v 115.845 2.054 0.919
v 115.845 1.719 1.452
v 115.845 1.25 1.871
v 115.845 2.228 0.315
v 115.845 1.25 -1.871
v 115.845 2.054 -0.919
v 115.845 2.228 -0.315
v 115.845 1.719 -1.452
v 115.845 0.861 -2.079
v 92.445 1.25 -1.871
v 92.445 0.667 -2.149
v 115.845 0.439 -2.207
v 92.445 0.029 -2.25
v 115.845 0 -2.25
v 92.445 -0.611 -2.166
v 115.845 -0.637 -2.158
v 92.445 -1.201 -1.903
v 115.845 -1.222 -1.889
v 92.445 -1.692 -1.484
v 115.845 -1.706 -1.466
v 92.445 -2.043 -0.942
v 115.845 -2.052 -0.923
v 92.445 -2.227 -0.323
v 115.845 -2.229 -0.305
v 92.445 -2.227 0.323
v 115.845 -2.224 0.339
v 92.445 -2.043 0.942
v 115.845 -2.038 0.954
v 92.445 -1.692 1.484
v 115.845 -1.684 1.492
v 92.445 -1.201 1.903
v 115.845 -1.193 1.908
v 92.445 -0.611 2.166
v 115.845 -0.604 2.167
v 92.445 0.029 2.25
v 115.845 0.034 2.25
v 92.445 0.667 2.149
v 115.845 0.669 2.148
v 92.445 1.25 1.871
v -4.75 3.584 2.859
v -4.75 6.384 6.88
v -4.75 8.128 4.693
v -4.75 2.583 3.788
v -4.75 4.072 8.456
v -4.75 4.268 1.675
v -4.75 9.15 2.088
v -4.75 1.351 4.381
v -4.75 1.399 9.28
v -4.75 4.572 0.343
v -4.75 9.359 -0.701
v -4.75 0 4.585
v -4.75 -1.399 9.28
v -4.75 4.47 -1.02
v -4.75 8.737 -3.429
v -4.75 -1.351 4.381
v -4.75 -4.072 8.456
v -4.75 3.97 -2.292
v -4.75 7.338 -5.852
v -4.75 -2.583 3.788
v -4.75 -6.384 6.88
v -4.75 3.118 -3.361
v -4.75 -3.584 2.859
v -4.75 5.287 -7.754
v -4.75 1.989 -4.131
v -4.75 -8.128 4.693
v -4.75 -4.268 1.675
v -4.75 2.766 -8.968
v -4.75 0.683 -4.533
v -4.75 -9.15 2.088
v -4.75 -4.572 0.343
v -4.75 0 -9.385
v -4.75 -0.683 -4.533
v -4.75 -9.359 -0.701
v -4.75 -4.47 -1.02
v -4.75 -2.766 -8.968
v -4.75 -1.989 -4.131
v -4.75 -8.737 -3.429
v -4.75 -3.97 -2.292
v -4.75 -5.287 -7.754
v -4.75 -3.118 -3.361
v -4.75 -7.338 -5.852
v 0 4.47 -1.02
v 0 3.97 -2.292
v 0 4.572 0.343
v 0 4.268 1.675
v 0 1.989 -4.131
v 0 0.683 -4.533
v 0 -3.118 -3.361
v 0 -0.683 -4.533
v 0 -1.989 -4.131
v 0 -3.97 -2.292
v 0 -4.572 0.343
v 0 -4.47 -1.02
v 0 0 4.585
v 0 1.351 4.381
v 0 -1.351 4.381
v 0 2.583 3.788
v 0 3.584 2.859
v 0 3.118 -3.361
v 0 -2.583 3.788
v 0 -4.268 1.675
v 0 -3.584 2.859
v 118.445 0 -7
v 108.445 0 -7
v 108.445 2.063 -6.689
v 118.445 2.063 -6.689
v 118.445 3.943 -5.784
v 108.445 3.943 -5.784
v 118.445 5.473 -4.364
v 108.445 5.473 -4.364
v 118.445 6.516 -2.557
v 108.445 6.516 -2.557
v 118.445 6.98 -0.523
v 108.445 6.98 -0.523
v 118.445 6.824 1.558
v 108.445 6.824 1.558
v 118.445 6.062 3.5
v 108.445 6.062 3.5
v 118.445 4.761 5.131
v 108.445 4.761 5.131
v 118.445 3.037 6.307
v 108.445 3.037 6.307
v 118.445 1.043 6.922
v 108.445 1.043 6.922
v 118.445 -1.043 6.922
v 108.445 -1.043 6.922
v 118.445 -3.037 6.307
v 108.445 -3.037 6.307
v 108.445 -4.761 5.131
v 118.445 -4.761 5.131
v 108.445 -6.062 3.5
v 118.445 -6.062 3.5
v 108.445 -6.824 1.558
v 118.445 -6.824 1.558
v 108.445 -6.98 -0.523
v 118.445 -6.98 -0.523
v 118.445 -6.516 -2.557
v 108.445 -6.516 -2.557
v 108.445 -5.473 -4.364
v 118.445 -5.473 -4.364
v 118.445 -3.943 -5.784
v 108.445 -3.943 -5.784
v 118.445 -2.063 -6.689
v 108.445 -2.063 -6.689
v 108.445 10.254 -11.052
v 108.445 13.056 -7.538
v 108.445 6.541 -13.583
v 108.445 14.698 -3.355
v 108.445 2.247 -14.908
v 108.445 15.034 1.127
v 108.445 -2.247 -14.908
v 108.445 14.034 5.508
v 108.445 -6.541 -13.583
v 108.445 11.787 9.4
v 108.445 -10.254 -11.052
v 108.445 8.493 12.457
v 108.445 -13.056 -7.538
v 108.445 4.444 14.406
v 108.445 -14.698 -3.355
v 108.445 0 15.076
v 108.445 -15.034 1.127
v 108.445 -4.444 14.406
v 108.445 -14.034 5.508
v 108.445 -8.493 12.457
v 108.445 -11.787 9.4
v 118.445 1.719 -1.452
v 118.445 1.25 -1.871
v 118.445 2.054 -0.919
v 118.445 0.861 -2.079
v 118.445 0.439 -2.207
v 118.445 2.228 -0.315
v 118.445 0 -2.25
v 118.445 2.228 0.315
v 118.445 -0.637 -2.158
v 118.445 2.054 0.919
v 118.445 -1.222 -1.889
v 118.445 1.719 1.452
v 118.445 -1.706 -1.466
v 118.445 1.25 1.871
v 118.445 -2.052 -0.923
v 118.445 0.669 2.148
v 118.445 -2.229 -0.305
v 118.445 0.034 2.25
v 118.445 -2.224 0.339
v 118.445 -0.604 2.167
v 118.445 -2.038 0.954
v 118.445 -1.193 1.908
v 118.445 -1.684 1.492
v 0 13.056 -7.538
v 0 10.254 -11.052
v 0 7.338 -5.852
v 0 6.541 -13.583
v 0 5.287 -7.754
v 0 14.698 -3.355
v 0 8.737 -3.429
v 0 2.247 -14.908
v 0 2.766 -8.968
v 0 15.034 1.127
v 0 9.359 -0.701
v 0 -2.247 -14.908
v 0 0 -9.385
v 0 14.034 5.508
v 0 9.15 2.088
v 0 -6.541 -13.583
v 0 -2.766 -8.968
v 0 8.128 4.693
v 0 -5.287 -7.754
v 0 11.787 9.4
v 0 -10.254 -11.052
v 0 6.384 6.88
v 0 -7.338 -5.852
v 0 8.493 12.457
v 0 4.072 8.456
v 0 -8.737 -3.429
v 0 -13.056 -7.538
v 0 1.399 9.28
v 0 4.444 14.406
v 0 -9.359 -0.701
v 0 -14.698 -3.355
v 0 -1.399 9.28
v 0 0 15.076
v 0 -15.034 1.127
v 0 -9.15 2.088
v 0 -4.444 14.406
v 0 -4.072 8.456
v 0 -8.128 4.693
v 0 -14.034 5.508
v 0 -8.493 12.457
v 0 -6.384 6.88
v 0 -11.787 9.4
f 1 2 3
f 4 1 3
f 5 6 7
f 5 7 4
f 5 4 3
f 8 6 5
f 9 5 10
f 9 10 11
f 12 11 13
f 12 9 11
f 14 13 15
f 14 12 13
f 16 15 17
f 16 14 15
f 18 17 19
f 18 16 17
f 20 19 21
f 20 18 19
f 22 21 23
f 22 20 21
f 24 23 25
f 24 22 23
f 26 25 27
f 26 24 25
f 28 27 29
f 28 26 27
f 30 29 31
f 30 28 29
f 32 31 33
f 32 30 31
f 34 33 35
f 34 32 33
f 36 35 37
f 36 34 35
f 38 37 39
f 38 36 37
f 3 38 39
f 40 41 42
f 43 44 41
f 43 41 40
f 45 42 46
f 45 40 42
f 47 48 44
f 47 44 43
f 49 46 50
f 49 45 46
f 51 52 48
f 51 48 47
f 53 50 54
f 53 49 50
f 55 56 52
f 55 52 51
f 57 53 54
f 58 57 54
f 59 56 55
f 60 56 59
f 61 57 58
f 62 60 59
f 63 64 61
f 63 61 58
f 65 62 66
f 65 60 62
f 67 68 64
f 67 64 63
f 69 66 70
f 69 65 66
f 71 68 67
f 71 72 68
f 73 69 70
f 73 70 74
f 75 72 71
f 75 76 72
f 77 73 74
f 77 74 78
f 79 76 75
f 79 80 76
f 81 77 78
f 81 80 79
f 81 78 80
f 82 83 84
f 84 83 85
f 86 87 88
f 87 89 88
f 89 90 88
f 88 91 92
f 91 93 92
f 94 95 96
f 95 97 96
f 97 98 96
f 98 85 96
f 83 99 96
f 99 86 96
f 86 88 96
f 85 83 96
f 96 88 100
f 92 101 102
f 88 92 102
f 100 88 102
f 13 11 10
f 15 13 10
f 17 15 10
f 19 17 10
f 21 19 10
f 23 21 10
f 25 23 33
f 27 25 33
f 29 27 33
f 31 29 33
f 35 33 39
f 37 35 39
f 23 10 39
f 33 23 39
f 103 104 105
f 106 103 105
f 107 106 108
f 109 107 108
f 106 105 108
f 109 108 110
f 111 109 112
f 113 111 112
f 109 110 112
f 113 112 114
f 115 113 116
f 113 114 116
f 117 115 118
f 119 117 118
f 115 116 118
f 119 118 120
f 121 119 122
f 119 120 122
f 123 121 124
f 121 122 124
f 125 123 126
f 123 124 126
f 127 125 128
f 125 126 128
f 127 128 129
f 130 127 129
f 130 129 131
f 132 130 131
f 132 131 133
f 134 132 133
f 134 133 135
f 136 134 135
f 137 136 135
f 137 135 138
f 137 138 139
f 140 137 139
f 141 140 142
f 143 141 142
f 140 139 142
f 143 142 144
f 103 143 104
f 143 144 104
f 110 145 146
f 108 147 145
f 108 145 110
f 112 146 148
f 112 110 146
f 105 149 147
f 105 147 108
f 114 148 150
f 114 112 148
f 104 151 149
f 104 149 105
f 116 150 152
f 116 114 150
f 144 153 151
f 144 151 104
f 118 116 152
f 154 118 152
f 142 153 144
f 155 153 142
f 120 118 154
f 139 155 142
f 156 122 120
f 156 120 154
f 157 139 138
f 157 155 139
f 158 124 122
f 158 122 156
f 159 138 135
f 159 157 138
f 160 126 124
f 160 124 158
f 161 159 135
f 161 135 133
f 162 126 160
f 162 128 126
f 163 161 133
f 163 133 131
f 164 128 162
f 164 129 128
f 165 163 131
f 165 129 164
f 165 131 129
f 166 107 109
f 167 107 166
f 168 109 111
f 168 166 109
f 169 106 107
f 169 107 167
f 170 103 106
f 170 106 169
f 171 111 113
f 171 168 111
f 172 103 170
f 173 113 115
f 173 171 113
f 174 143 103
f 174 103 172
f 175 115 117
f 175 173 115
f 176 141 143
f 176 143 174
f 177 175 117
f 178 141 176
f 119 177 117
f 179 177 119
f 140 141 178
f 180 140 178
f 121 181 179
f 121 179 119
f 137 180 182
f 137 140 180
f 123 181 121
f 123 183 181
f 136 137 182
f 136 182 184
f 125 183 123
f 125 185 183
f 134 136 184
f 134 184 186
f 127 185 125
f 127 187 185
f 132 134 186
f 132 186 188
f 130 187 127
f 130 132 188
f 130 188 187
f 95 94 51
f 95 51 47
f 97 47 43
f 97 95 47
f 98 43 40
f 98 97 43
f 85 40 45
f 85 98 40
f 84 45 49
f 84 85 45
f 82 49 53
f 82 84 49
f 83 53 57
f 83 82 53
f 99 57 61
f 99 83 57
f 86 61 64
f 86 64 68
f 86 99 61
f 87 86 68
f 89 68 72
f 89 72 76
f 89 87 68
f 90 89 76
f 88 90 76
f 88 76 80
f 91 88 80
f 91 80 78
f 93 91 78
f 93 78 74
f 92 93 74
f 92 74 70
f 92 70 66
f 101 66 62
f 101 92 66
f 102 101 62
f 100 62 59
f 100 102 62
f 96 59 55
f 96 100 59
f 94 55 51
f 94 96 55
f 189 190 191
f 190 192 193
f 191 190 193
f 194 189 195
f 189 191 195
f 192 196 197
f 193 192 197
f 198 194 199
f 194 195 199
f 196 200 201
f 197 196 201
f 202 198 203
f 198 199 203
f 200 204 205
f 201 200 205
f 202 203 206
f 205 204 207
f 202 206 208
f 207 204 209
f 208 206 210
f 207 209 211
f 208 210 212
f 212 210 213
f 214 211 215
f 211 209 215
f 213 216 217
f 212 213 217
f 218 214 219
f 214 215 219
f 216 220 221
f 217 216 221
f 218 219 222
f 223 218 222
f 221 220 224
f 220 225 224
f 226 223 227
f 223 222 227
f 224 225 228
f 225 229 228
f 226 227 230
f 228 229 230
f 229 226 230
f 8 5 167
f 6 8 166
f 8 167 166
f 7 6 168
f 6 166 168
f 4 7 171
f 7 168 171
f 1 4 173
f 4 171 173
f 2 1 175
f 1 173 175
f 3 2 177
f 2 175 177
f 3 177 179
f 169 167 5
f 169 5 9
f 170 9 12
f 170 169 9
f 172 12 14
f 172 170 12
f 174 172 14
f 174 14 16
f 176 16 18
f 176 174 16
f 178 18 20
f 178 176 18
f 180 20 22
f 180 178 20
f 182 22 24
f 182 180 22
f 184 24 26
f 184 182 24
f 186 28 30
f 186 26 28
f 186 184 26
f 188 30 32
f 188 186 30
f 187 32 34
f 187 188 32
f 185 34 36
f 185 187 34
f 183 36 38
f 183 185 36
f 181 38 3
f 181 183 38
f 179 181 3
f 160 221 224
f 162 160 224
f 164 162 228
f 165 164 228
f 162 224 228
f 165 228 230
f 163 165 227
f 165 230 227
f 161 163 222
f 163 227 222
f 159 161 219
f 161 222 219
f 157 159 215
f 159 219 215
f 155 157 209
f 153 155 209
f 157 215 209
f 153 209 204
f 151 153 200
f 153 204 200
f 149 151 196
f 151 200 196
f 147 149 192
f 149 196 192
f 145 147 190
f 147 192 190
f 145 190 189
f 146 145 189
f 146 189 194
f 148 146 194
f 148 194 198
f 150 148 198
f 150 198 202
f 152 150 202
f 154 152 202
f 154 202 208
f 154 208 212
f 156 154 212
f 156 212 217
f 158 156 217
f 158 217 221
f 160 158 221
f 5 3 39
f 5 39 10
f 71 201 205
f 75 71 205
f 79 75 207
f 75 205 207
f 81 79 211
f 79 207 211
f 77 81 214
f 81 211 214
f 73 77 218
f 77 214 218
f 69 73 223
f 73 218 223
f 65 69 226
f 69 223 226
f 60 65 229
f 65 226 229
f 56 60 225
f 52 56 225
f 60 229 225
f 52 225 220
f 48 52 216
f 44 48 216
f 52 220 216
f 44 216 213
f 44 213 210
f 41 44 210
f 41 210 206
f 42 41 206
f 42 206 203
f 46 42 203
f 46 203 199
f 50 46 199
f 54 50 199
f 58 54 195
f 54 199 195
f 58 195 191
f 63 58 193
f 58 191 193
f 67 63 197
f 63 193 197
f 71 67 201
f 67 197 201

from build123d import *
from build123d.topology import SkipClean

# Parameters (mm, degrees)
SKETCH1_R           = 15.07617
BOSS_EXTRUDE1_DEPTH = 118.4446395
SKETCH2_R           = 9.3853
SKETCH2_R_2         = 4.5847
BOSS_EXTRUDE2_DEPTH = 4.7498
CUT_EXTRUDE1_DEPTH  = 26
SKETCH4_R           = 2.25
CUT_EXTRUDE2_DEPTH  = 2.6
CUT_EXTRUDE3_START  = -10
SKETCH5_R           = 15.07617
SKETCH5_R_2         = 7
CUT_EXTRUDE3_DEPTH  = 10


with BuildPart() as part:
    # Sketch1 → Boss-Extrude1 (new body)
    with BuildSketch(Plane(origin=(0, 0, 0), x_dir=(0, 0, -1), z_dir=(1, 0, 0))):
        with Locations(Location((0, 0, 0), (0, 0, 180))):
            Circle(SKETCH1_R)
    extrude(amount=BOSS_EXTRUDE1_DEPTH)

    # Sketch2 → Boss-Extrude2 (add)
    with BuildSketch(Plane.ZY):
        with Locations(Location((0, 0, 0), (0, 0, 180))):
            Circle(SKETCH2_R)
        Circle(SKETCH2_R_2, mode=Mode.SUBTRACT)
    extrude(amount=BOSS_EXTRUDE2_DEPTH)

    # Sketch3 → Cut-Extrude1 (cut)
    with BuildSketch(Plane(origin=(118.4446395, 0, 0), x_dir=(0, 0, -1), z_dir=(1, 0, 0))):
        with BuildLine():
            Line((-1.870828693, 1.25), (1.870828693, 1.25))
            ThreePointArc((1.870828693, 1.25), (0, -2.25), (-1.870828693, 1.25))
        make_face()
    extrude(amount=-CUT_EXTRUDE1_DEPTH, mode=Mode.SUBTRACT)

    # Sketch4 → Cut-Extrude2 (cut)
    with SkipClean():  # the faces are left unmerged after this step: merging them gives an invalid solid
        with BuildSketch(Plane(origin=(118.4446395, 0, 0), x_dir=(0, 0, -1), z_dir=(1, 0, 0))):
            Circle(SKETCH4_R)
        extrude(amount=-CUT_EXTRUDE2_DEPTH, mode=Mode.SUBTRACT)

    # Sketch5 → Cut-Extrude3 (cut)
    with SkipClean():  # the faces are left unmerged after this step: merging them gives an invalid solid
        with BuildSketch(Plane(origin=(118.4446395, 0, 0), x_dir=(0, 0, -1), z_dir=(1, 0, 0)).offset(CUT_EXTRUDE3_START)):
            with Locations(Location((0, 0, 0), (0, 0, 180))):
                Circle(SKETCH5_R)
            Circle(SKETCH5_R_2, mode=Mode.SUBTRACT)
        extrude(amount=CUT_EXTRUDE3_DEPTH, mode=Mode.SUBTRACT)


solid = part.part
